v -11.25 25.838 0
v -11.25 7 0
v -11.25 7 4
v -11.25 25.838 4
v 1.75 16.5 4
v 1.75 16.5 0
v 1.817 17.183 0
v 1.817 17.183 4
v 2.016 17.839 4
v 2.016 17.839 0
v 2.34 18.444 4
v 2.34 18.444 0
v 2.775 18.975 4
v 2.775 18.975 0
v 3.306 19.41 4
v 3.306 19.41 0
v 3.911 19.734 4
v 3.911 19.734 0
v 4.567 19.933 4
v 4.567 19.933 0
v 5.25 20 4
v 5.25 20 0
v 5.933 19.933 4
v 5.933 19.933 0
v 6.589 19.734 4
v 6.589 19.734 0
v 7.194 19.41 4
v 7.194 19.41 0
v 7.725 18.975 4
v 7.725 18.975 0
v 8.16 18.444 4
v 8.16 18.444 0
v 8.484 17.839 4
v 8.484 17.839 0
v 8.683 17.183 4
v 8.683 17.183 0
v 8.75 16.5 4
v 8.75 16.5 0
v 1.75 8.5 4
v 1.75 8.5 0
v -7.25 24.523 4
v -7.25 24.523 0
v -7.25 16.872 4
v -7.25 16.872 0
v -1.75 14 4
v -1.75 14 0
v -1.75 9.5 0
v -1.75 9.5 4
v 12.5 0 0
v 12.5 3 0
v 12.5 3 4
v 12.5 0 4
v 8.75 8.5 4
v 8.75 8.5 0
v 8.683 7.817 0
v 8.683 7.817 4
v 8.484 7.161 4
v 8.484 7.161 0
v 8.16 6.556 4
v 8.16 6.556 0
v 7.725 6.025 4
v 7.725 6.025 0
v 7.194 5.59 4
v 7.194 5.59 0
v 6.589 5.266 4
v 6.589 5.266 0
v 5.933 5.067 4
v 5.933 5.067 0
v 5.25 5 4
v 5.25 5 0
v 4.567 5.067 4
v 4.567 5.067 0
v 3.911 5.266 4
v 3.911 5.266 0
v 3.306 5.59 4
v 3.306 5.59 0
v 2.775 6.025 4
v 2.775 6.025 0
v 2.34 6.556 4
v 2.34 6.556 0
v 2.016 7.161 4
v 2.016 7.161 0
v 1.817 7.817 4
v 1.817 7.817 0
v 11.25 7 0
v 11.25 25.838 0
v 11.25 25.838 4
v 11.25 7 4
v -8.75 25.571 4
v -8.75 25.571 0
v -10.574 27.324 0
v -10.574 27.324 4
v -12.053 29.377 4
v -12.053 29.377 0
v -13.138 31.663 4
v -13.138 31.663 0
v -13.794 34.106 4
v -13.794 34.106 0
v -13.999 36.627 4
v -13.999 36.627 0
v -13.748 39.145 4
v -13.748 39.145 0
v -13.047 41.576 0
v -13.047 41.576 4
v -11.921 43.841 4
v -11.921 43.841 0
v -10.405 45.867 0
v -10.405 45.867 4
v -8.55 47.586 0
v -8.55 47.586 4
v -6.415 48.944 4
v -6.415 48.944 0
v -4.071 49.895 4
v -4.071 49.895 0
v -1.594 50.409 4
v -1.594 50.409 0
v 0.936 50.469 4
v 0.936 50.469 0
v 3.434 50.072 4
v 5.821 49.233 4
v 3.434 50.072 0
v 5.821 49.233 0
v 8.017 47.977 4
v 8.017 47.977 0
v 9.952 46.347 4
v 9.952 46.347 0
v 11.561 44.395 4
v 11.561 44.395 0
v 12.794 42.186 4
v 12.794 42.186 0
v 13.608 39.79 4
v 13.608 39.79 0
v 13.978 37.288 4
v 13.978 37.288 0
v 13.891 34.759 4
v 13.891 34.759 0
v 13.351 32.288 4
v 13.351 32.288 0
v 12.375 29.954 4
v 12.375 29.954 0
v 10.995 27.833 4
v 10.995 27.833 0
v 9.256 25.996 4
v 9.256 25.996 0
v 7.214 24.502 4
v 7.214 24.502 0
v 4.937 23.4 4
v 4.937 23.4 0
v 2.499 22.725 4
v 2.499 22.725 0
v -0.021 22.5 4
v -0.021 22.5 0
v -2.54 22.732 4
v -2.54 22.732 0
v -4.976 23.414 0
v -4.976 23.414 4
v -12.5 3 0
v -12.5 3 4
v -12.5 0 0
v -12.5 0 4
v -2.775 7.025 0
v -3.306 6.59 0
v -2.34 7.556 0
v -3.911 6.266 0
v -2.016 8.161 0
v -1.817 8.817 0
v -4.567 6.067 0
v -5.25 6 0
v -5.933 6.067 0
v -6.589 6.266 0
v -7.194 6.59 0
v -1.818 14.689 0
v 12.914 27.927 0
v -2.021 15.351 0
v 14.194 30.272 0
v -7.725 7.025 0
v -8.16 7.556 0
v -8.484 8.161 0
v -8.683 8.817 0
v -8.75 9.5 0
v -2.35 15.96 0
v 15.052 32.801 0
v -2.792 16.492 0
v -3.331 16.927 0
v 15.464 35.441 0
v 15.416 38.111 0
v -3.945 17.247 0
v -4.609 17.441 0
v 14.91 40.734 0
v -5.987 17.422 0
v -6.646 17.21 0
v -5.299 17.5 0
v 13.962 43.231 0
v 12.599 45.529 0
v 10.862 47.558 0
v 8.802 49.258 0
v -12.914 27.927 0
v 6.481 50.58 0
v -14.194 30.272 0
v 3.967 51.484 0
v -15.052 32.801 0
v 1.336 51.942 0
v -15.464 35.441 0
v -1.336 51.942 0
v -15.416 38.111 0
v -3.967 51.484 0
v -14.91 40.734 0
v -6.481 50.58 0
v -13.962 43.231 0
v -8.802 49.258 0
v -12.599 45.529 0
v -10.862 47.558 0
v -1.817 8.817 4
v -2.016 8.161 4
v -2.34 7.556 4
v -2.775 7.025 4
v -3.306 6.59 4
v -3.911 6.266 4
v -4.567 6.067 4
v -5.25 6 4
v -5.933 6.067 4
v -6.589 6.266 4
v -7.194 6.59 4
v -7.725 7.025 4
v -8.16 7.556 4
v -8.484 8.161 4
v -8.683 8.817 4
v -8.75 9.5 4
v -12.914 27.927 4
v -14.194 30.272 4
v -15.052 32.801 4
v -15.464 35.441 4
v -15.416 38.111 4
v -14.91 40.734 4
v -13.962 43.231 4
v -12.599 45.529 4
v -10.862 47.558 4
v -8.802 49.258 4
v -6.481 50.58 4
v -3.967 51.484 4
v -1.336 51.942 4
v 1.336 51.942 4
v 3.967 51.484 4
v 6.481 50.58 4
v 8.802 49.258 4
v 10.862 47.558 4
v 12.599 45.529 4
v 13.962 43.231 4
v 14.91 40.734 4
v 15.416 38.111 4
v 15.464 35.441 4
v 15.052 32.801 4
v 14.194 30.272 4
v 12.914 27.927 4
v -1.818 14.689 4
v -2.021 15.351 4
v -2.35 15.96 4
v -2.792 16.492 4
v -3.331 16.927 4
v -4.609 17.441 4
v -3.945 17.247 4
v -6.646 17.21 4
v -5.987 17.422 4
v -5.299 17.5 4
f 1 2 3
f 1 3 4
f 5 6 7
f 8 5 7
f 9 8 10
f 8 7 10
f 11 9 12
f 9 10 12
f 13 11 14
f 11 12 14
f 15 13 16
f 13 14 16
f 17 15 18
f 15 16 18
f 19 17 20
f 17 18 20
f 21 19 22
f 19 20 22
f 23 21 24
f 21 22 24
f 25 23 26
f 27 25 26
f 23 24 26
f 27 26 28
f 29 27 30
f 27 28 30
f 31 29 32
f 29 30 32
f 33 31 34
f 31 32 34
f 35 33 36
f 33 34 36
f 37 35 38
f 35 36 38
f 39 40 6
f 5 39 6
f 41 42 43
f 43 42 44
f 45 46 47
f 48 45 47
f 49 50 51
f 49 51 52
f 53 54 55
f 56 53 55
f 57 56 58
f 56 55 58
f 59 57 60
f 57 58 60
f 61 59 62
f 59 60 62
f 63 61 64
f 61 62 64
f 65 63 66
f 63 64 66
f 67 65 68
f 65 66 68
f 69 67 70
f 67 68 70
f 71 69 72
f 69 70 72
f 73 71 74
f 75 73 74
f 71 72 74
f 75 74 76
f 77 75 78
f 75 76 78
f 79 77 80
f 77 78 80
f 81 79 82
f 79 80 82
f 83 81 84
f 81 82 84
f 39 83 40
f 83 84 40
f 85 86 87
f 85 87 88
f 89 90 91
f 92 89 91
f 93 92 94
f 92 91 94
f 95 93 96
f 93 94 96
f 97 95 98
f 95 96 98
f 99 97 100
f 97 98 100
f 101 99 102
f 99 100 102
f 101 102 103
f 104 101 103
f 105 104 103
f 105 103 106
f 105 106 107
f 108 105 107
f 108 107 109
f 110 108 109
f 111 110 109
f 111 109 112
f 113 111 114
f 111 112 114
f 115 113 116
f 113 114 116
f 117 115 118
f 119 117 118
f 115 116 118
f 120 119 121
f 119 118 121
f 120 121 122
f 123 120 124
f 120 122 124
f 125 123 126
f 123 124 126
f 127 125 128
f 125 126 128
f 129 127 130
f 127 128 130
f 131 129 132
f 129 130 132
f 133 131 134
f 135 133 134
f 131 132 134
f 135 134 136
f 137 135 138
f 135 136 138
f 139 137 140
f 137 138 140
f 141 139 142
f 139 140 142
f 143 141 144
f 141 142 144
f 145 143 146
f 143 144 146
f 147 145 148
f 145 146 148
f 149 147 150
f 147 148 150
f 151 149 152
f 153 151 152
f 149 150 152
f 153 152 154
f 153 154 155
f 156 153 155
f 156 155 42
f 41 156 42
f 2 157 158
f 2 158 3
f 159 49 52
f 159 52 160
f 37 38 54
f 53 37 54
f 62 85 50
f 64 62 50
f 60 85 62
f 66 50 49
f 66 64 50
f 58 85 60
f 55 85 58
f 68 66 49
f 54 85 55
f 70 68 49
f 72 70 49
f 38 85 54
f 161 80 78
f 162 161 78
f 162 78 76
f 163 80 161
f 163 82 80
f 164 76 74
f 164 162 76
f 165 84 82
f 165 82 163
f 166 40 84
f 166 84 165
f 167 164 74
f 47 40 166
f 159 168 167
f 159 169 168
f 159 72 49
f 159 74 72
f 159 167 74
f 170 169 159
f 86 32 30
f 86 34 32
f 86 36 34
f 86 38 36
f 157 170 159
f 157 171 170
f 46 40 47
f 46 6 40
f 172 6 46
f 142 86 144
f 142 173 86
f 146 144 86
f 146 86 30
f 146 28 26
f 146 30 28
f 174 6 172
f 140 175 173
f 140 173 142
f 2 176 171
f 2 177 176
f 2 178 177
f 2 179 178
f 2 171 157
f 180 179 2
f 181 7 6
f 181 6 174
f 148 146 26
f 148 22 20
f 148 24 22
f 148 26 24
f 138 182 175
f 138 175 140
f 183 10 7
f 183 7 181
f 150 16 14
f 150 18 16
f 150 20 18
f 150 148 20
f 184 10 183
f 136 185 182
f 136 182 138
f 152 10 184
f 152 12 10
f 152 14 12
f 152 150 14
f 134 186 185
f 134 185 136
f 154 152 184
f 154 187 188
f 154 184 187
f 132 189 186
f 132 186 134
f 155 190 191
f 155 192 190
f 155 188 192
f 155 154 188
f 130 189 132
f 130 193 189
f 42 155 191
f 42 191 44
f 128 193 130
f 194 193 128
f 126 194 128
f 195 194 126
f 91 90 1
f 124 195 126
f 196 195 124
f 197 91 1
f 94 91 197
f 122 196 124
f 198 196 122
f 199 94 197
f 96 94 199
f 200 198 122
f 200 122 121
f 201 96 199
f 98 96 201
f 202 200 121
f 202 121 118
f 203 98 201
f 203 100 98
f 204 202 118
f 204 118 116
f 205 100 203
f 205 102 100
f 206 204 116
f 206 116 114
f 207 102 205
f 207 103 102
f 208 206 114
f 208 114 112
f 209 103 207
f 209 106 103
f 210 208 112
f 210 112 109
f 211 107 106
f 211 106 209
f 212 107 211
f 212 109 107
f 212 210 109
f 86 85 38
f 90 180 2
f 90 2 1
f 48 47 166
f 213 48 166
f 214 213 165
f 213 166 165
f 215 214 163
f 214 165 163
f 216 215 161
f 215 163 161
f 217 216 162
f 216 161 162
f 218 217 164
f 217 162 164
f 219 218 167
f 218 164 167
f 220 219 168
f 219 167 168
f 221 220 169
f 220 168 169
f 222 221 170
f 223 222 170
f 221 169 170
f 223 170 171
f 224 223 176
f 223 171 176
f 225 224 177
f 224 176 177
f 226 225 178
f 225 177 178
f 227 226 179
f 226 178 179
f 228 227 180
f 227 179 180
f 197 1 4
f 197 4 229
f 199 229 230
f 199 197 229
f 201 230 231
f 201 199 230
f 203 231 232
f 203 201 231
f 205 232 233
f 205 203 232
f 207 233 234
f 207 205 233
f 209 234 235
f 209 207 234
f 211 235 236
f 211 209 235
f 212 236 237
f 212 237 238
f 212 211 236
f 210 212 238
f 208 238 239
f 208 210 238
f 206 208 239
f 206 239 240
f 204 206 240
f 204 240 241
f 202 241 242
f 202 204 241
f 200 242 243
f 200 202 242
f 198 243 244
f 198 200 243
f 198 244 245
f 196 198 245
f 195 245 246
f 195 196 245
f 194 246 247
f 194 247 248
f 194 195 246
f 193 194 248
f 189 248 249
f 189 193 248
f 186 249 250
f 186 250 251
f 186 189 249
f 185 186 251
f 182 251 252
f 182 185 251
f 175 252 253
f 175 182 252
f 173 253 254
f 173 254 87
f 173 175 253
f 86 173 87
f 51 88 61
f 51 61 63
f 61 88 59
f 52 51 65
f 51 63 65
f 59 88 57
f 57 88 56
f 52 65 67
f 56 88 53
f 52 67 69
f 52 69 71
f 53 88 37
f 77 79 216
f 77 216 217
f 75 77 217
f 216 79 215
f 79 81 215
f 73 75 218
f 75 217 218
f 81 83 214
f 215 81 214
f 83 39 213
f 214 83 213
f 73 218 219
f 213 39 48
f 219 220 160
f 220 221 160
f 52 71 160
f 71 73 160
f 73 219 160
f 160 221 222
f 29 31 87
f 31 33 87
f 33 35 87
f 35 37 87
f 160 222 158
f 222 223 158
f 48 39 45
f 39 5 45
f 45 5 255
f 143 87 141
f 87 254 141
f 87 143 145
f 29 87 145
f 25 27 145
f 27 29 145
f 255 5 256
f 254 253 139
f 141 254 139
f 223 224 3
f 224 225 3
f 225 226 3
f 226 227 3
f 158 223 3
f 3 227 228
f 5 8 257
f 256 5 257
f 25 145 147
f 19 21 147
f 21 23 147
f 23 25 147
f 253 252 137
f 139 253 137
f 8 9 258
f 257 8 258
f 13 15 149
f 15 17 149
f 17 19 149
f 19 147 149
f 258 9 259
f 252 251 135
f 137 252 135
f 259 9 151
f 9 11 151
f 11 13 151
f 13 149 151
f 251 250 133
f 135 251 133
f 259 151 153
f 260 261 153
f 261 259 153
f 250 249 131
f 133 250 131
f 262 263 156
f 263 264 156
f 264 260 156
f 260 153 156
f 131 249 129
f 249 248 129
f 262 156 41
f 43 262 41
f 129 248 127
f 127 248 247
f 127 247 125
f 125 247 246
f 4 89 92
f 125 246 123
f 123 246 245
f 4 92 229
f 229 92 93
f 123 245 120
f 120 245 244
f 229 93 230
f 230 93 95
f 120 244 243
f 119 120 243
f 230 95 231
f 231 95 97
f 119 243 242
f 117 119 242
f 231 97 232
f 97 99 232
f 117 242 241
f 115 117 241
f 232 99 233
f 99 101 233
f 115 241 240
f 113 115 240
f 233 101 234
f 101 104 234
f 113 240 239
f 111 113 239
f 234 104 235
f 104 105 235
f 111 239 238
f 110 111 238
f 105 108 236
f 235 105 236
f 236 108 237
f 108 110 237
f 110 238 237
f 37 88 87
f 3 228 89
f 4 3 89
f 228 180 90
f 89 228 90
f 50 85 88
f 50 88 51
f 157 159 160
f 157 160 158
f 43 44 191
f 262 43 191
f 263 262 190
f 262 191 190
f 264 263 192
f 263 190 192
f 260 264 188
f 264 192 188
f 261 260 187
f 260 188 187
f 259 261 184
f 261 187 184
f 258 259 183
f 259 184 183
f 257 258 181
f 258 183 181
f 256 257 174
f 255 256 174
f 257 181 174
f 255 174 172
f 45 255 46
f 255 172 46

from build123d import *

# Parameters (mm, degrees)
DODANIE_WYCI_GNI_CIE1_DEPTH = 4


with BuildPart() as part:
    # Szkic1 → Dodanie-wyciągnięcie1 (new body)
    with BuildSketch(Plane.XY):
        with BuildLine():
            Line((12.5, 0), (-12.5, 0))
            Line((-12.5, 0), (-12.5, 3))
            Line((-12.5, 3), (-11.25, 7))
            Line((-11.25, 7), (-11.25, 25.837565944))
            ThreePointArc((-11.25, 25.837565944), (0, 52), (11.25, 25.837565944))
            Line((11.25, 25.837565944), (11.25, 7))
            Line((11.25, 7), (12.5, 3))
            Line((12.5, 3), (12.5, 0))
        make_face()
        with BuildLine():
            Line((8.75, 16.5), (8.75, 8.5))
            ThreePointArc((8.75, 8.5), (5.25, 5), (1.75, 8.5))
            Line((1.75, 8.5), (1.75, 16.5))
            ThreePointArc((1.75, 16.5), (5.25, 20), (8.75, 16.5))
        make_face(mode=Mode.SUBTRACT)
        with BuildLine():
            Line((-1.75, 14), (-1.75, 9.5))
            ThreePointArc((-1.75, 9.5), (-5.25, 6), (-8.75, 9.5))
            Line((-8.75, 9.5), (-8.75, 14))
            Line((-8.75, 14), (-8.75, 25.571253503))
            ThreePointArc((-8.75, 25.571253503), (8.017135871, 47.977174409), (-7.25, 24.523460433))
            Line((-7.25, 24.523460433), (-7.25, 16.872281323))
            ThreePointArc((-7.25, 16.872281323), (-3.629814825, 17.102418411), (-1.75, 14))
        make_face(mode=Mode.SUBTRACT)
    extrude(amount=DODANIE_WYCI_GNI_CIE1_DEPTH)


solid = part.part
